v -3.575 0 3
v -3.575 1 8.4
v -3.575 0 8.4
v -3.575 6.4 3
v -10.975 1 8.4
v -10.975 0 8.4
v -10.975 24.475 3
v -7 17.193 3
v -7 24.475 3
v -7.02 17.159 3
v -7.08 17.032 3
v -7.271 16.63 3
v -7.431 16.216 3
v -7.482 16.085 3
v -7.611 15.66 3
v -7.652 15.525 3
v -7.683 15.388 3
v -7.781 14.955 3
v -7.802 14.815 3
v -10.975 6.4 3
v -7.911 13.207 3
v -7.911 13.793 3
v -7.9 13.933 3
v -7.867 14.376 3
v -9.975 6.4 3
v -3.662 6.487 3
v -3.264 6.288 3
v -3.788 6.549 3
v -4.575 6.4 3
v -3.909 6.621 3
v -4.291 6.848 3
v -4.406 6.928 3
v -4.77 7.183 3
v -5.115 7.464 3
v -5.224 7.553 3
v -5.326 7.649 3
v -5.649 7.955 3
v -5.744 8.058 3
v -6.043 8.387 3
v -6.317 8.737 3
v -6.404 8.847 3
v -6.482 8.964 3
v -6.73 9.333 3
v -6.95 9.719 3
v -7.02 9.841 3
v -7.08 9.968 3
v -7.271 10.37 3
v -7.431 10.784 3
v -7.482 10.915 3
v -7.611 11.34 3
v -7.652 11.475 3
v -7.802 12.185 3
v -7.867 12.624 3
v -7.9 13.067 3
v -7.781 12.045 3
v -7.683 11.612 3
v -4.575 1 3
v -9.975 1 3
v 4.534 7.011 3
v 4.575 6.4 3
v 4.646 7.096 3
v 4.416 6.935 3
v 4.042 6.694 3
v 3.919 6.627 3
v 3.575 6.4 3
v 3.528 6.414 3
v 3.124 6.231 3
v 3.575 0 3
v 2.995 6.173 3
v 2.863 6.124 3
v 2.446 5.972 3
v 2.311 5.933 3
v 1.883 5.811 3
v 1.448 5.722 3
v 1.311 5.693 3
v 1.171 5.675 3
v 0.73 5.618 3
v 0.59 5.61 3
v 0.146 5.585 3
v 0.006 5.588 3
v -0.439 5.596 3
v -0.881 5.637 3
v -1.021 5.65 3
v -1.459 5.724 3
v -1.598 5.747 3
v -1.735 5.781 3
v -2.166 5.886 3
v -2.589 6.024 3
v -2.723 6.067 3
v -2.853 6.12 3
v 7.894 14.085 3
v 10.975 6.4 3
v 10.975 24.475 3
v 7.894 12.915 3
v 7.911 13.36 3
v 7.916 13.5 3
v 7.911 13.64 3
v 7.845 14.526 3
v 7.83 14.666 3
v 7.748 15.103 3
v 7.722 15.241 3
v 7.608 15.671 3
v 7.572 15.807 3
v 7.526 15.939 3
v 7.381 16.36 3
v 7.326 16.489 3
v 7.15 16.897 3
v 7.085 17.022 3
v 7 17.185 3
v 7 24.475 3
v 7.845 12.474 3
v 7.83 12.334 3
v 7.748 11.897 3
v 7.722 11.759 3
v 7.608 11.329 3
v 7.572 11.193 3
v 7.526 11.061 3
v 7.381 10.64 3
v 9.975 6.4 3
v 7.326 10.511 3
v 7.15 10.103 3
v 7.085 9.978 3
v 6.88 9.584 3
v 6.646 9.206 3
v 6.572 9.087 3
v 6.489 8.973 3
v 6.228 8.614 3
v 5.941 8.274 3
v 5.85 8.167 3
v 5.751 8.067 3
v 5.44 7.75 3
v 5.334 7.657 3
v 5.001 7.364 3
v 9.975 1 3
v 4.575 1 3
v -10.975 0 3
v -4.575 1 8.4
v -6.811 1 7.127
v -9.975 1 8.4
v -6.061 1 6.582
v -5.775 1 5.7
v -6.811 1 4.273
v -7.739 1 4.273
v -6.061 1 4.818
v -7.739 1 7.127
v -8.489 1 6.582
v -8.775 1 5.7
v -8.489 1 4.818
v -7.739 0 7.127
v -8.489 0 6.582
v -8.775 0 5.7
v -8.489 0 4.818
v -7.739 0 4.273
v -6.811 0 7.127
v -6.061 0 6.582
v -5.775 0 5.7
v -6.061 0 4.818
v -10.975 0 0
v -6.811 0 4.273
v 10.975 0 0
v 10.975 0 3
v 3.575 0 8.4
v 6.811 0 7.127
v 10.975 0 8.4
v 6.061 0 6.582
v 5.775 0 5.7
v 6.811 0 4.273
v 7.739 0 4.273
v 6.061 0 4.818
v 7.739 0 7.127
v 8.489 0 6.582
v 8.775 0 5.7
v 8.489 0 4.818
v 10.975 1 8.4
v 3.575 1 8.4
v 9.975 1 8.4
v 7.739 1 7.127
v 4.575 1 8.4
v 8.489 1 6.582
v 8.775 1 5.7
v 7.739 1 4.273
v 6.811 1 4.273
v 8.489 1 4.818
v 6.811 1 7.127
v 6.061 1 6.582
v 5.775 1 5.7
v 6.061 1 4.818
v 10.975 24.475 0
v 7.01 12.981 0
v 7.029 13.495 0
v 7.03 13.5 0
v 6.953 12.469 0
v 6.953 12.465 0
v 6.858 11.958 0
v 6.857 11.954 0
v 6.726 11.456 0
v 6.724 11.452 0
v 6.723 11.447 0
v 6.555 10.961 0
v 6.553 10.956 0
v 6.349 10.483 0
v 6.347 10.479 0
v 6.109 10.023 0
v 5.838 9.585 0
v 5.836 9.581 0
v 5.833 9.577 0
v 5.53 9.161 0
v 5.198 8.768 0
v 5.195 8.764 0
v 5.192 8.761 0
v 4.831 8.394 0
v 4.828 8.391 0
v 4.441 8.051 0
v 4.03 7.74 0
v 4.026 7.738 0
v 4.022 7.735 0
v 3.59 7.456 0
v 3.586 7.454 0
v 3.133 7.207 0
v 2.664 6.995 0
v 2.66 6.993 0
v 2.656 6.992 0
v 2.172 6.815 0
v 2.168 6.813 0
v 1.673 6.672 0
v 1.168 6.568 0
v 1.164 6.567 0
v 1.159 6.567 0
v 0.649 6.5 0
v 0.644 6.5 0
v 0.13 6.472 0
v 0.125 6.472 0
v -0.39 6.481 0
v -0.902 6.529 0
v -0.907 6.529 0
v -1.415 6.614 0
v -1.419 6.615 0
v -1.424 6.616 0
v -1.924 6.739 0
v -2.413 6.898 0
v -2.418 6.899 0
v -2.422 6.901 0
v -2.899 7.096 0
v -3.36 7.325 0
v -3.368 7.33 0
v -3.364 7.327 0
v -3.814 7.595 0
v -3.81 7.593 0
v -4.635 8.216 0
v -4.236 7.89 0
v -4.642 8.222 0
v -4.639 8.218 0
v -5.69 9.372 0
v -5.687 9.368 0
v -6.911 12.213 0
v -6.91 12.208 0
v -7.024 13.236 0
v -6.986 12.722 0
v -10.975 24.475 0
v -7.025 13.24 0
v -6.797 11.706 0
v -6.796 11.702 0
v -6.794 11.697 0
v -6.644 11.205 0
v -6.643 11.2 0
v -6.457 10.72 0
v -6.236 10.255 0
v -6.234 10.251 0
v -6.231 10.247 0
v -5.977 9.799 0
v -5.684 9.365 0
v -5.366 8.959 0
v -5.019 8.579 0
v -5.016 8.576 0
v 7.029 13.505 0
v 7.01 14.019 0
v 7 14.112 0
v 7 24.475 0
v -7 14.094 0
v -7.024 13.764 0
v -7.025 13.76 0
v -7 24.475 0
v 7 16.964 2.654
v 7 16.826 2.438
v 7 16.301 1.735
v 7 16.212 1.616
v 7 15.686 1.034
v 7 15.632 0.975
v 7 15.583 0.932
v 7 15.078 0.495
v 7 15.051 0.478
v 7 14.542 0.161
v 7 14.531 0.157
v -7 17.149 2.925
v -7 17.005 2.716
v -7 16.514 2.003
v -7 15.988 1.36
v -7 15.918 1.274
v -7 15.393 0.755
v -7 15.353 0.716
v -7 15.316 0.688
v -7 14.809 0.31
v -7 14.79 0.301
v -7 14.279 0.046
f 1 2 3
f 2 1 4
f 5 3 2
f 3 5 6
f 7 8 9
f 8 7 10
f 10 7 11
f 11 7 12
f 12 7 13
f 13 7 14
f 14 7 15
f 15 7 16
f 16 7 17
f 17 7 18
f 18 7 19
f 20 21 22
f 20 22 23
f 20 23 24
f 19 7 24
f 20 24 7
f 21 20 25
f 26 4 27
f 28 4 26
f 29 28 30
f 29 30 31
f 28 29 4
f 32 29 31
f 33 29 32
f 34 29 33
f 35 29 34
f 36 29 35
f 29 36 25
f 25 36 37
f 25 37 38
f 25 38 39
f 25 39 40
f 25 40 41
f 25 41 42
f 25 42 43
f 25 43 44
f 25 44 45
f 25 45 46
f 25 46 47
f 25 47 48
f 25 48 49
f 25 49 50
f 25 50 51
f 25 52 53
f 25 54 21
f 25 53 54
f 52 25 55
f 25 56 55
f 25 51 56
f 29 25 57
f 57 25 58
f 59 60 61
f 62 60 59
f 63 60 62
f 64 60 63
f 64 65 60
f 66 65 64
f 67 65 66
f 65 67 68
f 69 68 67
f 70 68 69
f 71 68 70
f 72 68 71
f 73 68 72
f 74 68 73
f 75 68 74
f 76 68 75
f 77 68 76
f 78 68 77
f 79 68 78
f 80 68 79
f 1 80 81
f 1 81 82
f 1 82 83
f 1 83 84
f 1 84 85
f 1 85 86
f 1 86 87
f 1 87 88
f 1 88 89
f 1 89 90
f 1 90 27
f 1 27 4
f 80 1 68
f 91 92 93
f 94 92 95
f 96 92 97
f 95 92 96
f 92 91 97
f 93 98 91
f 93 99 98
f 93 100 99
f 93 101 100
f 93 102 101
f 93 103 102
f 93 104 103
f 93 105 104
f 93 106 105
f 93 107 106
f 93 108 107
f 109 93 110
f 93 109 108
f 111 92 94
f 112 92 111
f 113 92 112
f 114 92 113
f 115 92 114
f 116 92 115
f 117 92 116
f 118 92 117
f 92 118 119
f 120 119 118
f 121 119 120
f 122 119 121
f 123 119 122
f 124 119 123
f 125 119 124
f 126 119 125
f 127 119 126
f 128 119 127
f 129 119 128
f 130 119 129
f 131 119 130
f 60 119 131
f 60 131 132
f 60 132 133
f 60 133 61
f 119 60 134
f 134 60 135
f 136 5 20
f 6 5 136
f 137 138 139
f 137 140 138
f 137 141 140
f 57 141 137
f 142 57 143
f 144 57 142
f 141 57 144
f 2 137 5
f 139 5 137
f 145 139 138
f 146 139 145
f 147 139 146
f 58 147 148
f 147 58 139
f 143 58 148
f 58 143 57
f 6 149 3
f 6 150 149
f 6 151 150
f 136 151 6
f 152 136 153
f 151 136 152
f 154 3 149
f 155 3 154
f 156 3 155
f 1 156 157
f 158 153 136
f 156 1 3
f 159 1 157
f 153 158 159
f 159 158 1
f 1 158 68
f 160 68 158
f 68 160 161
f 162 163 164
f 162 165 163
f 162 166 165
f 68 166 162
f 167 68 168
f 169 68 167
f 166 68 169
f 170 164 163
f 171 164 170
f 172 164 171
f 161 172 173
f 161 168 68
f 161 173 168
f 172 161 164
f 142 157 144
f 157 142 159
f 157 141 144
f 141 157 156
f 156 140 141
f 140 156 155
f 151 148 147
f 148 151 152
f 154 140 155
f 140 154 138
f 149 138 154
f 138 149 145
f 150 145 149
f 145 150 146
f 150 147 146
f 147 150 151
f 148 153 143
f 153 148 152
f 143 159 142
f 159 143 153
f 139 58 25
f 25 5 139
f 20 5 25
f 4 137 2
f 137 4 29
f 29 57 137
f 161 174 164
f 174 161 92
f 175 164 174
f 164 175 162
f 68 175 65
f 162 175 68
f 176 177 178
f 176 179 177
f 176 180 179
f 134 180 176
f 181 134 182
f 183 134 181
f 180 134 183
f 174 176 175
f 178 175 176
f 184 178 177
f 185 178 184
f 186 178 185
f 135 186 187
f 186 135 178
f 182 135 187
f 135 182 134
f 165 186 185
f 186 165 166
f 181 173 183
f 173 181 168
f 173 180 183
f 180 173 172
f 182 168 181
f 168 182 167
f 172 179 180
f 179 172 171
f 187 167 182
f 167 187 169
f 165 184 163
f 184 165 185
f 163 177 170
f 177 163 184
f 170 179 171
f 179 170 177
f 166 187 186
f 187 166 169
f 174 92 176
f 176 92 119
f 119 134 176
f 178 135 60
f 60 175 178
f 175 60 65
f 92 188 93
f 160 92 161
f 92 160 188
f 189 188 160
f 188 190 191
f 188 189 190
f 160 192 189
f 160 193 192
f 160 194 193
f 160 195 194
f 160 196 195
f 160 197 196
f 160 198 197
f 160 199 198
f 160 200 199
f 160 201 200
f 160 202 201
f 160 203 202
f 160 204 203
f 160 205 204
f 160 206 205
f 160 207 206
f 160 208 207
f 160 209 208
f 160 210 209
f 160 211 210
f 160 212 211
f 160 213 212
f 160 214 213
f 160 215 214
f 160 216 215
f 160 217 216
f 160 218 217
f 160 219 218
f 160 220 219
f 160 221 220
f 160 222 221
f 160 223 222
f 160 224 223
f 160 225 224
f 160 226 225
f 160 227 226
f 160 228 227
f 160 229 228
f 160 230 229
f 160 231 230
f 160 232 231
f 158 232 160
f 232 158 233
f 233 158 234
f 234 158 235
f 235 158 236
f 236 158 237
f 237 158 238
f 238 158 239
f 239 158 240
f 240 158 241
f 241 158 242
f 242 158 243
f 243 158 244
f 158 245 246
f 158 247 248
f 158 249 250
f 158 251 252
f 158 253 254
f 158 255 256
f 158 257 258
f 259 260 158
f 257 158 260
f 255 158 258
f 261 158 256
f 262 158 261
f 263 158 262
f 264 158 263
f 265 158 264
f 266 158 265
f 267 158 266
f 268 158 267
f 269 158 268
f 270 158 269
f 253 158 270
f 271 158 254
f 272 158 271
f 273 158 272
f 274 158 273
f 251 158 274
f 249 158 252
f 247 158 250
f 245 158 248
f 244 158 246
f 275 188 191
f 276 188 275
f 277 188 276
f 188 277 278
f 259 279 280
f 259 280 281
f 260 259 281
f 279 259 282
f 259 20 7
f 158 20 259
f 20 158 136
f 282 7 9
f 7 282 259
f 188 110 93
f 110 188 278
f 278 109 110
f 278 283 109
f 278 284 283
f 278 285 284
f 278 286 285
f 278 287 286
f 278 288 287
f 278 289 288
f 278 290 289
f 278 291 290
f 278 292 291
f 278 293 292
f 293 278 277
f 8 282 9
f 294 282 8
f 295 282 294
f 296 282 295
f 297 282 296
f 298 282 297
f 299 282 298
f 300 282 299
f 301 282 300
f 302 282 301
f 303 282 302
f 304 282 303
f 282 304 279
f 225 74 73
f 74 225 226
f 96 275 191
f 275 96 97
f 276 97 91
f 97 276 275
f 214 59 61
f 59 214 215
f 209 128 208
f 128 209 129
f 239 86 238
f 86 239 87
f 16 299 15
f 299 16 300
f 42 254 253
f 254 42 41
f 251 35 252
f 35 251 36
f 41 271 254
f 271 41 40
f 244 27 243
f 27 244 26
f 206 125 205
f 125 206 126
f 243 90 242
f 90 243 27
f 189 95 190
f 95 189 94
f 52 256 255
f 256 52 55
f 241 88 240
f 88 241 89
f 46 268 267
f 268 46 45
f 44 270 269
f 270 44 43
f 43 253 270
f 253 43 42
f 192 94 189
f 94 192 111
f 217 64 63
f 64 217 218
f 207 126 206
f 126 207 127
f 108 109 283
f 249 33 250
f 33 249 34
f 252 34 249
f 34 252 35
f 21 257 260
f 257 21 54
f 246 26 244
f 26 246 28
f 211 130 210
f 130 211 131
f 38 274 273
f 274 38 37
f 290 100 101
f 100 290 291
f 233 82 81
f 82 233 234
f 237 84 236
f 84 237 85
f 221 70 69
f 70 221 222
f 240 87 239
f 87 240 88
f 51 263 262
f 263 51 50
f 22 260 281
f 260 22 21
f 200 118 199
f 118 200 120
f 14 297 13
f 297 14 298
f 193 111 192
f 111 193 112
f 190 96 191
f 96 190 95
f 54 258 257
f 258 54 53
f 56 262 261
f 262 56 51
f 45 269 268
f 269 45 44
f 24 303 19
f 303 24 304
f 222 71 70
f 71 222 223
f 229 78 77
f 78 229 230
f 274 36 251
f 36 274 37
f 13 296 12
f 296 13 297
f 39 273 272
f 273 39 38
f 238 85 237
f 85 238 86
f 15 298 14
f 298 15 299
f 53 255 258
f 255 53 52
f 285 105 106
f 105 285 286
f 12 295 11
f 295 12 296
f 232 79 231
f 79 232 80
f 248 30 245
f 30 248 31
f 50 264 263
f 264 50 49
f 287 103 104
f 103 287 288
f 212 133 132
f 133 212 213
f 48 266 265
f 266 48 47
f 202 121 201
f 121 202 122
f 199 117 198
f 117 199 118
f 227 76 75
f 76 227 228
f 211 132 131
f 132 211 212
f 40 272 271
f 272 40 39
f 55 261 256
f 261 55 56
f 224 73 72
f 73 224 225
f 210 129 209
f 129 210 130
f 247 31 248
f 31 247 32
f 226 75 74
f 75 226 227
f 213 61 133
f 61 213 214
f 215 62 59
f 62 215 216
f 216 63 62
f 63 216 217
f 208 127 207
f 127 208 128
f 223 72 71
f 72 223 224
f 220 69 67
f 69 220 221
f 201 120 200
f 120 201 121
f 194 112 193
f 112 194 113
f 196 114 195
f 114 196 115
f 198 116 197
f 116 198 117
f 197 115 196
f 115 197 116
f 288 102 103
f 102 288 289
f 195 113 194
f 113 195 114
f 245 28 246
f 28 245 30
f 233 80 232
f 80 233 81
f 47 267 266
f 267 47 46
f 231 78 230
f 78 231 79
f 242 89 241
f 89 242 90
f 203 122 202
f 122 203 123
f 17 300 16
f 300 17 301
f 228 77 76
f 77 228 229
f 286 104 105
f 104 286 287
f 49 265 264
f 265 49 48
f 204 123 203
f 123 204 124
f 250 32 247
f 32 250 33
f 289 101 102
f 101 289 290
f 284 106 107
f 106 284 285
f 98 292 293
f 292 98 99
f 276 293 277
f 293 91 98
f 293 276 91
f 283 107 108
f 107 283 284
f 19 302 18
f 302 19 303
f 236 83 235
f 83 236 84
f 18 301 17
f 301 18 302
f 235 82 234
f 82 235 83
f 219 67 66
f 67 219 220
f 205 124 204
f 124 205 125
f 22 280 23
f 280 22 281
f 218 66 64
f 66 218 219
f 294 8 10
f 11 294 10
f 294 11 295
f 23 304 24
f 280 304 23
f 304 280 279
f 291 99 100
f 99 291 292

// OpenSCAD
// file: config.scad
/*
 * config
 *
 * Copyright 2013 <b@Zi.iS>
 * License CC BY 3.0
 */

$fa = 1;
$fs = 1;
preview = 1;

// preview colors
color_steal = [.8,.8,.8];
color_wood = [.3,.3,0];
color_print = [0,.8,0];

// metric bolt sizes
function m_hole(size) = size*1.1/2;
function m_pilot(size) = size*.9/2;

mounting_bolt = 3;

// slightly move and slightly elongate objects in preview to overcome scad rounding errors
module e() {
	if(preview==1) {
		translate([
			0,
			0,
			-.1
		]) {
			scale([
				1,
				1,
				1.1
			]) {
				child();
			}
		}
	} else {
		child();
	}
}

module m_washer(
	size = 3
) {
	color(color_steal) {
		difference() {
			cylinder(
				r = size/2*2,
				h = size*.2
			);
			e() cylinder(
				r = size/2,
				h = size*.2
			);
		}
	}
	translate([
		0,
		0,
		size*.2
	]) {
		child();
	}
}

module m_nut(
	size = 3
) {
	color(color_steal) {
		difference() {
			cylinder(
				r = size*1.8/2,
				h = size*.8,
				$fn = 6
			);
		}
	}
	translate([
		0,
		0,
		size*.8
	]) {
		child();
	}
}

module m_nylock(
	size = 3
) {
	color(color_steal) {
		difference() {
			cylinder(
				r = size*1.8/2,
				h = size,
				$fn = 6
			);
		}
	}
	translate([
		0,
		0,
		size
	]) {
		child();
	}
}

module screw(
	r = 1,
	h = 1,
	pitch = 5,
) {
	linear_extrude(
		height = h,
		twist = -h/pitch*360
	) {
		translate([pitch/5,0,0]) { //H=.2*p works better in plastic then ISO's H=.866*p
			circle(
				r=r 
			);
		}
	}
}

fan40 = [
	40,			//width/length
	10,			//height
	32,			//bolt pitch
	3,			//bolt
];

lm8uu = [
	15.2/2,	//outside
	8/2,	//inside
	26,		//length
];
// main file
/*
 * Holder for screwdrivers
 *
 * Copyright 2013 <b@Zi.iS>
 * License CC BY 3.0
 */
include <config.scad>;

holder_screwdriver();

module holder_screwdriver(
	r = 14/2,
	r_max = 27/2,
	r_gap = 20,
	t = 3
) {
	r_top = (r_max-r)/(r_gap/t)+r;

	difference() {
		union() {
			for(x=[0:1]) {
				translate([
					-r_top-t + (r_top*2+t*2)*x,
					0,
					t
				]) {
					tag(chirality=x);
				}
			}
			translate([
				-r_top-t,
				0,
				0
			]) {
				cube([
					r_top*2+t*2,
					r_max+r_top+t,
					t
				]);
			}
		}
		e() translate([
			-r,
			r_max,
			-1
		]) {
			cube([
				r*2,
				r_max,
				t*2
			]);
		}
		e() translate([
			0,
			r_max,
			0
		]) {
			cylinder(
				r1=r,
				r2=r_max,
		     	h = r_gap
			);
		}
	}

	//Screwdriver
	translate([
		0,
		r_max,
		0
	]) {
		%cylinder(
			r1=r,
			r2=r_max,
	     	h = r_gap
		);
	}
	translate([
		0,
		r_max,
		-r_gap*2
	]) {
		%cylinder(
			r=r,
	     	h = r_gap*2
		);
	}
}

module tag(
	size = 3,
	t = 1,
	chirality = 0
) {
	center_chirality = chirality == 0 ? 1 : -1;
	r = size*1.8/2;

	difference() {
		translate([
			-(r+t)*2 * chirality,
			0,
			0,
		]) {
			cube([
				(r+t)*2,
				t,
				r*2,
			]);
		}
		translate([
			(r+t) * center_chirality,
			-1,
			r,
		]) {
			rotate([
				-90,
				0,
				0
			]) {
				cylinder(
					r = size/2,
					h = t+2
				);
			}
		}
	}
	for(x=[0:1]) {
		translate([
			t-t*chirality-(r*2+t)*x*-center_chirality,
			t,
			0,
		]) {
			rotate([
				0,
				-90,
				0
			]) {
				linear_extrude(
					height = t
				) {
					polygon([
						[0,0],
						[r*2,0],
						[0,r*2],
					]);
				}
			}
		}
	}
}
